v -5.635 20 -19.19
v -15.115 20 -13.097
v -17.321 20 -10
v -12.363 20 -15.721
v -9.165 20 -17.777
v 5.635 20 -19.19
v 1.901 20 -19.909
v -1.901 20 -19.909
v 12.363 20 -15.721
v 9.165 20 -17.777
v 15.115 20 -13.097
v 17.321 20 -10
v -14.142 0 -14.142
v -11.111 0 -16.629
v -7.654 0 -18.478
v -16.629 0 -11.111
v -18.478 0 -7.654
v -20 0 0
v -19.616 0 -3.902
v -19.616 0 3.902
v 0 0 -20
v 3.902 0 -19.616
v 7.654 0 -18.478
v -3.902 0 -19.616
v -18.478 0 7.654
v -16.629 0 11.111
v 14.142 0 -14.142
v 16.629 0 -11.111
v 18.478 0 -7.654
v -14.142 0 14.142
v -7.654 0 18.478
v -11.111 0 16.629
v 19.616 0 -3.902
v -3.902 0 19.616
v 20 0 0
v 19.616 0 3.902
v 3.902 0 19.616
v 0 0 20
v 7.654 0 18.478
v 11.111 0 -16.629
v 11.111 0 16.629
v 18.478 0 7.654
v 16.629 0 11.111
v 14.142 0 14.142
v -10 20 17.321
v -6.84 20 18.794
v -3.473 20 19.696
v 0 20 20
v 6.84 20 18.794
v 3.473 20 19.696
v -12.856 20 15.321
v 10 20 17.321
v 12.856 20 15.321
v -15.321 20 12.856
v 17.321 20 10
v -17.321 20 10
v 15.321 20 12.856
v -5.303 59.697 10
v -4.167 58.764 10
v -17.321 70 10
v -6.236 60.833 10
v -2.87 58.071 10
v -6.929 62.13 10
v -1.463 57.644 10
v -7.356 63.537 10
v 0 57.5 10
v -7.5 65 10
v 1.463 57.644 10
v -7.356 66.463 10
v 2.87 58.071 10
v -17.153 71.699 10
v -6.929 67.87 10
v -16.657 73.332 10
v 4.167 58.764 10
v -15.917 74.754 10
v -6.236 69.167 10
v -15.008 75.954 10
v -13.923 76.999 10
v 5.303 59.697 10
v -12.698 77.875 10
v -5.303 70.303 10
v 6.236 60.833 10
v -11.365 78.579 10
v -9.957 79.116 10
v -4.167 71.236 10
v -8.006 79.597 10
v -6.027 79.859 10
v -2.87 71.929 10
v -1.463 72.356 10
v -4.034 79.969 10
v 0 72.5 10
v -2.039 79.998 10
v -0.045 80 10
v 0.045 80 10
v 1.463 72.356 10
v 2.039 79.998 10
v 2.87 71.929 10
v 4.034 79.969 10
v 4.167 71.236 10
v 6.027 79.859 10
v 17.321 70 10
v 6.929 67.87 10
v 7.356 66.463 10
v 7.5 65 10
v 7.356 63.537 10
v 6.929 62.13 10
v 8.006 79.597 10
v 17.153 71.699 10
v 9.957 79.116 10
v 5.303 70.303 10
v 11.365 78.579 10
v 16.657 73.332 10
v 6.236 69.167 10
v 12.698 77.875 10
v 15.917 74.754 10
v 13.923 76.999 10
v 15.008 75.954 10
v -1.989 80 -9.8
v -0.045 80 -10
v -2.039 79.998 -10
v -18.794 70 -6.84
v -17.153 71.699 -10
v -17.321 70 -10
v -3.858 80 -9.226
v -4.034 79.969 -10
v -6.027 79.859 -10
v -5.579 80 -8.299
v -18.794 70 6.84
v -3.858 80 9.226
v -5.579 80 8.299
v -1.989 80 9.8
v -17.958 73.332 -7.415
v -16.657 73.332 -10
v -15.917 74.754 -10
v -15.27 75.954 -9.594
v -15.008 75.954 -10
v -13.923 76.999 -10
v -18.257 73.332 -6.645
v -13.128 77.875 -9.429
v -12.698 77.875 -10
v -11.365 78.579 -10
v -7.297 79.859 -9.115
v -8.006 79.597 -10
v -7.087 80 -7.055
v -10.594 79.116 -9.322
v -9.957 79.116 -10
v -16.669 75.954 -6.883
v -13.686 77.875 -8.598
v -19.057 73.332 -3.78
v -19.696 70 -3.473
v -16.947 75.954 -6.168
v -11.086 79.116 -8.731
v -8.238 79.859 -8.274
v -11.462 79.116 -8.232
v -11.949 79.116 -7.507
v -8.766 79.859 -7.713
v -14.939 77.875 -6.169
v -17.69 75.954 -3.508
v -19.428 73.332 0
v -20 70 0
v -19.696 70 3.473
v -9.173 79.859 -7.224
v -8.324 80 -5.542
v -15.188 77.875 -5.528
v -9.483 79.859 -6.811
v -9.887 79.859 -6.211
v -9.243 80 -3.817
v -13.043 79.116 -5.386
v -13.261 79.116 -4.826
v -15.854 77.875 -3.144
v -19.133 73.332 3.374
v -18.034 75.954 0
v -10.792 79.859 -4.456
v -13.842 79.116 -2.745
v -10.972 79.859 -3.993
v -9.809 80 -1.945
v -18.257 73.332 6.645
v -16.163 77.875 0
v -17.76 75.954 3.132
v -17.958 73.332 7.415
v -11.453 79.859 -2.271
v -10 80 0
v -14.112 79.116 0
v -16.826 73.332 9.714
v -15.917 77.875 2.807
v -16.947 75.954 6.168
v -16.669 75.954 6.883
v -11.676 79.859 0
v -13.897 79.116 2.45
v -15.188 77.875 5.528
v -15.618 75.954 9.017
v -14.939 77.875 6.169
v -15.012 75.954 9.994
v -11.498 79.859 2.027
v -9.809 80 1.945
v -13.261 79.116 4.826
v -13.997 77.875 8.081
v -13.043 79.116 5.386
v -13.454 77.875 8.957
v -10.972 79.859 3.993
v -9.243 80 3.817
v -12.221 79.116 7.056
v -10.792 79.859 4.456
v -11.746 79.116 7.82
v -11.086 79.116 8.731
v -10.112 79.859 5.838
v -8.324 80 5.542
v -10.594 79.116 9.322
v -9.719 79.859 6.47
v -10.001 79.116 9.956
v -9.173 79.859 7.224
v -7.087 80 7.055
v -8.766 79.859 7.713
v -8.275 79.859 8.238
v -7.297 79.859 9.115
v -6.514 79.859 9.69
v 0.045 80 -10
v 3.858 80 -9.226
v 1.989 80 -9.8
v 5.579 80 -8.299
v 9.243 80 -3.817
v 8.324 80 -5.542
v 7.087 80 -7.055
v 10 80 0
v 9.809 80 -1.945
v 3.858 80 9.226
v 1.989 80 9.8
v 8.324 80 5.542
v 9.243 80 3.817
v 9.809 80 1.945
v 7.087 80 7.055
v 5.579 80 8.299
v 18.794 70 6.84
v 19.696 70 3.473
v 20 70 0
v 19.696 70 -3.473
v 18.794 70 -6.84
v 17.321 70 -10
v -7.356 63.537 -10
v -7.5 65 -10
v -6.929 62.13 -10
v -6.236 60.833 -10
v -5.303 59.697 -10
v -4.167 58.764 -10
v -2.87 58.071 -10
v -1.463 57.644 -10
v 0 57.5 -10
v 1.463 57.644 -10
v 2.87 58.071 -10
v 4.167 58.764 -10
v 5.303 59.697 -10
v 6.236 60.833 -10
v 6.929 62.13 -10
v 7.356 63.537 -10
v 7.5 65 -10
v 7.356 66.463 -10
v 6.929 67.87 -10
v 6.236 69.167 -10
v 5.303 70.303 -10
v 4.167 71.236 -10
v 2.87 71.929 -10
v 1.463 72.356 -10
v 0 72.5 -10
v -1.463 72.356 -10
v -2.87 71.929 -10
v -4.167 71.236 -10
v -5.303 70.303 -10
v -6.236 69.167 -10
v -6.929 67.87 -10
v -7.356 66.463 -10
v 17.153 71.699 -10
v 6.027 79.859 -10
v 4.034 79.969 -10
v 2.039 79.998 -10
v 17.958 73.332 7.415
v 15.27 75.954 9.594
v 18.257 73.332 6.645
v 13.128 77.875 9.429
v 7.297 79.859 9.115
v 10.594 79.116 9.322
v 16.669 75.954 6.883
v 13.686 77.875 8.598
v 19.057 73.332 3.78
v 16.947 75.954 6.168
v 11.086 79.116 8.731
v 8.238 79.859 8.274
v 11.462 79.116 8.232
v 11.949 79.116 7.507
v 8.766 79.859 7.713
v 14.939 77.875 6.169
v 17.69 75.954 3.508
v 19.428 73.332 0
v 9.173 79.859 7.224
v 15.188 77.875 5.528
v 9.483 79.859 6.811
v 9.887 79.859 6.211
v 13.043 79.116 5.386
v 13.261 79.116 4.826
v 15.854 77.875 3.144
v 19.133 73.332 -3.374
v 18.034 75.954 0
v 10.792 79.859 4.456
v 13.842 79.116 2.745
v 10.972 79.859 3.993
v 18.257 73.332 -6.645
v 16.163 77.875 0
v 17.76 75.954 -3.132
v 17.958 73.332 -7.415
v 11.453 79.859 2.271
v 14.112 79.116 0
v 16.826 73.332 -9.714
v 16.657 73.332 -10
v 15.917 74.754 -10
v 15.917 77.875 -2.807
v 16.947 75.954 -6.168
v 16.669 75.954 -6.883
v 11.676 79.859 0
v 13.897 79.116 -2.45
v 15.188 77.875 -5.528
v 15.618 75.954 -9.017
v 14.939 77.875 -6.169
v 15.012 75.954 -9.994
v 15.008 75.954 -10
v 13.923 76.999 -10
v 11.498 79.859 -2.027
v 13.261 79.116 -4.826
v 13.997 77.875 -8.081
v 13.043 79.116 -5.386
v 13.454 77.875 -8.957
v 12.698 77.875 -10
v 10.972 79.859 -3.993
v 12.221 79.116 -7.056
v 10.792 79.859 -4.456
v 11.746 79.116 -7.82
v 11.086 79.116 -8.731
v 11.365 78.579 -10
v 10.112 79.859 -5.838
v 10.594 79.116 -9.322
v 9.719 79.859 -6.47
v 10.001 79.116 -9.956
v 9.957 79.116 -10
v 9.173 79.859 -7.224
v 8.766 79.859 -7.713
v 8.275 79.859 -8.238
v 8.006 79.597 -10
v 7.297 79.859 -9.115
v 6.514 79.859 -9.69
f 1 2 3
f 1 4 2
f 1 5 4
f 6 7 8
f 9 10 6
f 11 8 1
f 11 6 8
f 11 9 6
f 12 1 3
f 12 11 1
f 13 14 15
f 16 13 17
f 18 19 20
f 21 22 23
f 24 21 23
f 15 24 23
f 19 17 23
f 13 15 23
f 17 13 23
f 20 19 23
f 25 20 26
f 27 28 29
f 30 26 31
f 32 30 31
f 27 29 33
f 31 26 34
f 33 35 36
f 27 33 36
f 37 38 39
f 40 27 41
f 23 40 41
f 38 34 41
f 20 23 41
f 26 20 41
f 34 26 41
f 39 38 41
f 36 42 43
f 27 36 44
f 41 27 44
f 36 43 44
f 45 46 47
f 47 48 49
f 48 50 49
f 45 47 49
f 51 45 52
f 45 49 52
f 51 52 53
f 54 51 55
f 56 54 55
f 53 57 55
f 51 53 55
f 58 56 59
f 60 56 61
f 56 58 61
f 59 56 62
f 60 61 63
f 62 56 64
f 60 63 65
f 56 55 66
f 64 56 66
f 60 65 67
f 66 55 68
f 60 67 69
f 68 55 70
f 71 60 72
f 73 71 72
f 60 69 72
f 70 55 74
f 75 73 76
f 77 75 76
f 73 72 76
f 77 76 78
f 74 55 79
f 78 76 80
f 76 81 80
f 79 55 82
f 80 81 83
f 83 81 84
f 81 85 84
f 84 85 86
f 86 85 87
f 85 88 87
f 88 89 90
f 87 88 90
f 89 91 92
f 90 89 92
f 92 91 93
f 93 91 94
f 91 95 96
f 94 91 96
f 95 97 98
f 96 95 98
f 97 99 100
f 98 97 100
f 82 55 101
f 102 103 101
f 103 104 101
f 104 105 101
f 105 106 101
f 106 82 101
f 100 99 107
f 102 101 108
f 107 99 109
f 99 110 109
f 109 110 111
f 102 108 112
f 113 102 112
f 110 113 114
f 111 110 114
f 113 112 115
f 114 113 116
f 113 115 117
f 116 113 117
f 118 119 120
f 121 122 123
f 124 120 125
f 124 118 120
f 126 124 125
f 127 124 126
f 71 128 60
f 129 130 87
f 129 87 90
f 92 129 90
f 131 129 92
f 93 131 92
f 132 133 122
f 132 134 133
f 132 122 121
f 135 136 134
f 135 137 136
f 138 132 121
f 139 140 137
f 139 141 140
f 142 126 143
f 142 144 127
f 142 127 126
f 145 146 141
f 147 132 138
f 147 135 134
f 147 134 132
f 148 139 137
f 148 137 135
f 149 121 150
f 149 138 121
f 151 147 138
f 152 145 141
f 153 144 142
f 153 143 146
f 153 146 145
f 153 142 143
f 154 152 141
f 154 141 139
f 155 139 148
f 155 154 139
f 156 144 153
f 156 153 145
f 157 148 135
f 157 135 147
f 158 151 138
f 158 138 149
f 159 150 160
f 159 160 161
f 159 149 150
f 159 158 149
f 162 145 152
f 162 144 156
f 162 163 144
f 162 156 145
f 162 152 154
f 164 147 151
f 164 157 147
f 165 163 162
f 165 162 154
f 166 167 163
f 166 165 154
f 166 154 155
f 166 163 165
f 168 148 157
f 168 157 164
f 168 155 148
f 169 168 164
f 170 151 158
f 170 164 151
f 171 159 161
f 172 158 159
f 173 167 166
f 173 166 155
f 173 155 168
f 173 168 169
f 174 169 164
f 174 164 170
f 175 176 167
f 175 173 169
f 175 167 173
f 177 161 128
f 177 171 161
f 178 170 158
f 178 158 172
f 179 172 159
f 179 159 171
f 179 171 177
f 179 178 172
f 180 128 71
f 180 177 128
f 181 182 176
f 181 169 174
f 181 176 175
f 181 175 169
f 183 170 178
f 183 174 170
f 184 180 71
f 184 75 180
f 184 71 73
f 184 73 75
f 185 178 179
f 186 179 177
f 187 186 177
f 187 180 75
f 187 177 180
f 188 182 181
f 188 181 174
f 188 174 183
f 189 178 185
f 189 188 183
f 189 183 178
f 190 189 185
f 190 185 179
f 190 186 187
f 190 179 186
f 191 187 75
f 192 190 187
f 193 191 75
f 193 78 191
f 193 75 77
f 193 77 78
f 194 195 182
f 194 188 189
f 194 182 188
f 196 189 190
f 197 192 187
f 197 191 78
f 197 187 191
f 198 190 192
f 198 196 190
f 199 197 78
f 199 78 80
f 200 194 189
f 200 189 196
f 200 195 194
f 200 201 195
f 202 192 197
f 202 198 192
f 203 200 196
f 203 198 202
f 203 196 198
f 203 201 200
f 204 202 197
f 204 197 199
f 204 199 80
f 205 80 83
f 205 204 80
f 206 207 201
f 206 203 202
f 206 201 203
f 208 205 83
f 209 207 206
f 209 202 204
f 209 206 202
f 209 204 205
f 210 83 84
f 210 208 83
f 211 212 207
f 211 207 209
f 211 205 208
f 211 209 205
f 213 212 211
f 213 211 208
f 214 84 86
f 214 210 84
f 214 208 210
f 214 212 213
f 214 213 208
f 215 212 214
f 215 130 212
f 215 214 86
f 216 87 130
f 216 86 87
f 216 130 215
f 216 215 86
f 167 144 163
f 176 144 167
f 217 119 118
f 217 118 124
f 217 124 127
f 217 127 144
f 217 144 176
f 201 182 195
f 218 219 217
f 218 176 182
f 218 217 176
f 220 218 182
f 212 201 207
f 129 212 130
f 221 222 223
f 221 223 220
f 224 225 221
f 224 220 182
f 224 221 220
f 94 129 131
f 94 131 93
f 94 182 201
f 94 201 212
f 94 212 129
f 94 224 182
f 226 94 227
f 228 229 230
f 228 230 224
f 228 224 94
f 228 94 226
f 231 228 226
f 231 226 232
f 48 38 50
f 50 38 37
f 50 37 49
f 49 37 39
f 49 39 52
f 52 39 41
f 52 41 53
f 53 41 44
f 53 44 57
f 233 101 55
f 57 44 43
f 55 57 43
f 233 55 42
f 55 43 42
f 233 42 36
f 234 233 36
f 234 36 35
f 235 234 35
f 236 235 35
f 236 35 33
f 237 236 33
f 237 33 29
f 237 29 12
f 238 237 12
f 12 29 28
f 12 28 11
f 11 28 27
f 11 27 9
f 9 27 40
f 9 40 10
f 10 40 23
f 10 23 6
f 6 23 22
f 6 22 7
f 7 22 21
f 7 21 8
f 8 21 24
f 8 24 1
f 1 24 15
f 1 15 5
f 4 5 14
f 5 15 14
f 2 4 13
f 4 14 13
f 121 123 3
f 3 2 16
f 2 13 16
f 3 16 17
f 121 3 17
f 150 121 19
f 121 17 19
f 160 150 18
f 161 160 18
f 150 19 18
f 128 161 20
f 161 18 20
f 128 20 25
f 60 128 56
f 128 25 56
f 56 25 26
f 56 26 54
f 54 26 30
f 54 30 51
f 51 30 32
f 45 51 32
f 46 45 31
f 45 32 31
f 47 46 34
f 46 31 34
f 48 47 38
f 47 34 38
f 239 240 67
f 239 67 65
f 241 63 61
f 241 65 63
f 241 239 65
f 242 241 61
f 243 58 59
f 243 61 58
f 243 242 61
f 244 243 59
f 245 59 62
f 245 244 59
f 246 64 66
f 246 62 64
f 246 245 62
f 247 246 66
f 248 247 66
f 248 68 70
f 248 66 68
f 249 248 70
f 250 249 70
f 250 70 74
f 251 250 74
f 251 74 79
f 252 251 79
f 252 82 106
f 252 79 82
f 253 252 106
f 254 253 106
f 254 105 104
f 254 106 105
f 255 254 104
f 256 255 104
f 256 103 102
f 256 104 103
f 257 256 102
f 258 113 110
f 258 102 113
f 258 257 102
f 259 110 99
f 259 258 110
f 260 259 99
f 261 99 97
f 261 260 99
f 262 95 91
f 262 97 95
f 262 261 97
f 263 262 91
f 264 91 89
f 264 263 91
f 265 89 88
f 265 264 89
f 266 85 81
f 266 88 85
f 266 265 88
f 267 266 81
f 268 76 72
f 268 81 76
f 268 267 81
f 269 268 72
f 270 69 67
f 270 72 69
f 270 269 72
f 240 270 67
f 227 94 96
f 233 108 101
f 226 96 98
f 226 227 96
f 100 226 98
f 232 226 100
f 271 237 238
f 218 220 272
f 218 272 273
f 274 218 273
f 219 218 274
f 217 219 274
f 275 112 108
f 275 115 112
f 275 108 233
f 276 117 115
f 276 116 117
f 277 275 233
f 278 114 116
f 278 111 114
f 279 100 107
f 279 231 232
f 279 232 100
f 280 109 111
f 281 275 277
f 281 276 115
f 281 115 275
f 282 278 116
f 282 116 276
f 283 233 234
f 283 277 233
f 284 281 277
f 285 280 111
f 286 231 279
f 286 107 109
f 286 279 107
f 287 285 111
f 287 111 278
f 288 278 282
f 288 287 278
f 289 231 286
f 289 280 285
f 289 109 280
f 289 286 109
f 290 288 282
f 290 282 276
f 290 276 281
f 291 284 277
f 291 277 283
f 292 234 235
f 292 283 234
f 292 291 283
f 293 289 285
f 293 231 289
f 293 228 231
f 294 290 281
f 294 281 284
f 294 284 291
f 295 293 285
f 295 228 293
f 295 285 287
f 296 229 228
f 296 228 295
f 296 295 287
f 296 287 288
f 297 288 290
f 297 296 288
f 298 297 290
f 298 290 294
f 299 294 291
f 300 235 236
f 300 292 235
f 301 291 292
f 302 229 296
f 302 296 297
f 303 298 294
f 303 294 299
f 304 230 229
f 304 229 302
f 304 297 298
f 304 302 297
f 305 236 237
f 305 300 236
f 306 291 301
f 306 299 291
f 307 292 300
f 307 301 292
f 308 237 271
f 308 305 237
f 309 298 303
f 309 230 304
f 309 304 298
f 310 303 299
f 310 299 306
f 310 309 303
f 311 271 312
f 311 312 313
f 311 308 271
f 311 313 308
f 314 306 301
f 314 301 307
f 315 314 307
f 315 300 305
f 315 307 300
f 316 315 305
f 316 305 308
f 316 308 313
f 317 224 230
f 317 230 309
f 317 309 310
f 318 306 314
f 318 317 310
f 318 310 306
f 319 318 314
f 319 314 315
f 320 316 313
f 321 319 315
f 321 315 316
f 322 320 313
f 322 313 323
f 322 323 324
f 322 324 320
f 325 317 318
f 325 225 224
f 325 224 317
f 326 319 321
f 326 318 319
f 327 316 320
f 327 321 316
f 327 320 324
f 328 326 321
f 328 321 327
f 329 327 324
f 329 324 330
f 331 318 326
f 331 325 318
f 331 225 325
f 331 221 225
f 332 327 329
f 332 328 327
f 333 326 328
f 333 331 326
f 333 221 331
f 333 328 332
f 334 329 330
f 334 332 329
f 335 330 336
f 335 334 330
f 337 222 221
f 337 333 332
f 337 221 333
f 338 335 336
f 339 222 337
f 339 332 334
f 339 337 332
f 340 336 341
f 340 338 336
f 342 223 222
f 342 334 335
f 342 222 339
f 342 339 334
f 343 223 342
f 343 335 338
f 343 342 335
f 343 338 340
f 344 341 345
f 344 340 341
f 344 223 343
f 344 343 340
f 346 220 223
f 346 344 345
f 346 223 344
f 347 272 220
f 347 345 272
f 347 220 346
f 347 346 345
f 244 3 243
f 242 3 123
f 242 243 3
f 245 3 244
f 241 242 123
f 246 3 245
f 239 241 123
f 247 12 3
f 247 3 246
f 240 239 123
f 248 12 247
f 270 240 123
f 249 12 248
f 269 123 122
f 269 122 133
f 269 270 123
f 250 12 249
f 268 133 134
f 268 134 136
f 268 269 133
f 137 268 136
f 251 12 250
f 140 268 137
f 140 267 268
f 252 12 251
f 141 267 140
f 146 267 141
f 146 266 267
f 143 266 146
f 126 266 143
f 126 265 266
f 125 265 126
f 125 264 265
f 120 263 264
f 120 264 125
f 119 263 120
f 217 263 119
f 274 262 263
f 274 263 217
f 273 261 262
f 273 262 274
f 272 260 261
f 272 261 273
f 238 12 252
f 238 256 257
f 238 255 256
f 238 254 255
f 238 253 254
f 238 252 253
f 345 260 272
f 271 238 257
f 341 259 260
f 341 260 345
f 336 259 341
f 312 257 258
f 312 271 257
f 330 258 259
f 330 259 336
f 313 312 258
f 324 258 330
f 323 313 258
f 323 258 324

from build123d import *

# Parameters (mm, degrees)
SKETCH1_R               = 20
BOSS_EXTRUDE1_DEPTH     = 80
SKETCH2_W               = 20
SKETCH2_H               = 120
CUT_EXTRUDE1_DEPTH      = 85.852813742
FILLET1_R               = 10
CUT_EXTRUDE2_DEPTH      = 85.85281386
CUT_EXTRUDE2_DEPTH_BACK = 85.85281386
SKETCH3_R               = 7.5


with BuildPart() as part:
    # Sketch1 → Boss-Extrude1 (new body)
    with BuildSketch(Plane(origin=(0, 0, 0), x_dir=(1, 0, 0), z_dir=(0, 1, 0))):
        with Locations(Location((0, 0, 0), (0, 0, 270))):
            Circle(SKETCH1_R)
    extrude(amount=BOSS_EXTRUDE1_DEPTH)

    # Sketch2 → Cut-Extrude1 (cut, symmetric)
    with BuildSketch(Plane(origin=(0, 0, 0), x_dir=(0, 0, -1), z_dir=(1, 0, 0))):
        with Locations((-20, 80)):
            Rectangle(SKETCH2_W, SKETCH2_H)
    cut_extrude1 = extrude(amount=CUT_EXTRUDE1_DEPTH, both=True, mode=Mode.SUBTRACT)

    # Mirror1: Cut-Extrude1 across plane
    add(cut_extrude1.mirror(Plane.XY), mode=Mode.SUBTRACT)

    # Fillet1
    fillet1_edges = [part.edges().sort_by_distance(p)[0] for p in [
        (20, 80, 0),
        (-20, 80, 0),
    ]]
    fillet(fillet1_edges, radius=FILLET1_R - 0.0001)  # a hair under: the kernel refuses the full size

    # Sketch3 → Cut-Extrude2 (cut, two sides: drawn at the far end of the back side and taken through both)
    with BuildSketch(Plane.XY.offset(-CUT_EXTRUDE2_DEPTH_BACK)):
        with Locations(Location((0, 65, 0), (0, 0, 180))):
            Circle(SKETCH3_R)
    extrude(amount=CUT_EXTRUDE2_DEPTH + CUT_EXTRUDE2_DEPTH_BACK, mode=Mode.SUBTRACT)


solid = part.part
